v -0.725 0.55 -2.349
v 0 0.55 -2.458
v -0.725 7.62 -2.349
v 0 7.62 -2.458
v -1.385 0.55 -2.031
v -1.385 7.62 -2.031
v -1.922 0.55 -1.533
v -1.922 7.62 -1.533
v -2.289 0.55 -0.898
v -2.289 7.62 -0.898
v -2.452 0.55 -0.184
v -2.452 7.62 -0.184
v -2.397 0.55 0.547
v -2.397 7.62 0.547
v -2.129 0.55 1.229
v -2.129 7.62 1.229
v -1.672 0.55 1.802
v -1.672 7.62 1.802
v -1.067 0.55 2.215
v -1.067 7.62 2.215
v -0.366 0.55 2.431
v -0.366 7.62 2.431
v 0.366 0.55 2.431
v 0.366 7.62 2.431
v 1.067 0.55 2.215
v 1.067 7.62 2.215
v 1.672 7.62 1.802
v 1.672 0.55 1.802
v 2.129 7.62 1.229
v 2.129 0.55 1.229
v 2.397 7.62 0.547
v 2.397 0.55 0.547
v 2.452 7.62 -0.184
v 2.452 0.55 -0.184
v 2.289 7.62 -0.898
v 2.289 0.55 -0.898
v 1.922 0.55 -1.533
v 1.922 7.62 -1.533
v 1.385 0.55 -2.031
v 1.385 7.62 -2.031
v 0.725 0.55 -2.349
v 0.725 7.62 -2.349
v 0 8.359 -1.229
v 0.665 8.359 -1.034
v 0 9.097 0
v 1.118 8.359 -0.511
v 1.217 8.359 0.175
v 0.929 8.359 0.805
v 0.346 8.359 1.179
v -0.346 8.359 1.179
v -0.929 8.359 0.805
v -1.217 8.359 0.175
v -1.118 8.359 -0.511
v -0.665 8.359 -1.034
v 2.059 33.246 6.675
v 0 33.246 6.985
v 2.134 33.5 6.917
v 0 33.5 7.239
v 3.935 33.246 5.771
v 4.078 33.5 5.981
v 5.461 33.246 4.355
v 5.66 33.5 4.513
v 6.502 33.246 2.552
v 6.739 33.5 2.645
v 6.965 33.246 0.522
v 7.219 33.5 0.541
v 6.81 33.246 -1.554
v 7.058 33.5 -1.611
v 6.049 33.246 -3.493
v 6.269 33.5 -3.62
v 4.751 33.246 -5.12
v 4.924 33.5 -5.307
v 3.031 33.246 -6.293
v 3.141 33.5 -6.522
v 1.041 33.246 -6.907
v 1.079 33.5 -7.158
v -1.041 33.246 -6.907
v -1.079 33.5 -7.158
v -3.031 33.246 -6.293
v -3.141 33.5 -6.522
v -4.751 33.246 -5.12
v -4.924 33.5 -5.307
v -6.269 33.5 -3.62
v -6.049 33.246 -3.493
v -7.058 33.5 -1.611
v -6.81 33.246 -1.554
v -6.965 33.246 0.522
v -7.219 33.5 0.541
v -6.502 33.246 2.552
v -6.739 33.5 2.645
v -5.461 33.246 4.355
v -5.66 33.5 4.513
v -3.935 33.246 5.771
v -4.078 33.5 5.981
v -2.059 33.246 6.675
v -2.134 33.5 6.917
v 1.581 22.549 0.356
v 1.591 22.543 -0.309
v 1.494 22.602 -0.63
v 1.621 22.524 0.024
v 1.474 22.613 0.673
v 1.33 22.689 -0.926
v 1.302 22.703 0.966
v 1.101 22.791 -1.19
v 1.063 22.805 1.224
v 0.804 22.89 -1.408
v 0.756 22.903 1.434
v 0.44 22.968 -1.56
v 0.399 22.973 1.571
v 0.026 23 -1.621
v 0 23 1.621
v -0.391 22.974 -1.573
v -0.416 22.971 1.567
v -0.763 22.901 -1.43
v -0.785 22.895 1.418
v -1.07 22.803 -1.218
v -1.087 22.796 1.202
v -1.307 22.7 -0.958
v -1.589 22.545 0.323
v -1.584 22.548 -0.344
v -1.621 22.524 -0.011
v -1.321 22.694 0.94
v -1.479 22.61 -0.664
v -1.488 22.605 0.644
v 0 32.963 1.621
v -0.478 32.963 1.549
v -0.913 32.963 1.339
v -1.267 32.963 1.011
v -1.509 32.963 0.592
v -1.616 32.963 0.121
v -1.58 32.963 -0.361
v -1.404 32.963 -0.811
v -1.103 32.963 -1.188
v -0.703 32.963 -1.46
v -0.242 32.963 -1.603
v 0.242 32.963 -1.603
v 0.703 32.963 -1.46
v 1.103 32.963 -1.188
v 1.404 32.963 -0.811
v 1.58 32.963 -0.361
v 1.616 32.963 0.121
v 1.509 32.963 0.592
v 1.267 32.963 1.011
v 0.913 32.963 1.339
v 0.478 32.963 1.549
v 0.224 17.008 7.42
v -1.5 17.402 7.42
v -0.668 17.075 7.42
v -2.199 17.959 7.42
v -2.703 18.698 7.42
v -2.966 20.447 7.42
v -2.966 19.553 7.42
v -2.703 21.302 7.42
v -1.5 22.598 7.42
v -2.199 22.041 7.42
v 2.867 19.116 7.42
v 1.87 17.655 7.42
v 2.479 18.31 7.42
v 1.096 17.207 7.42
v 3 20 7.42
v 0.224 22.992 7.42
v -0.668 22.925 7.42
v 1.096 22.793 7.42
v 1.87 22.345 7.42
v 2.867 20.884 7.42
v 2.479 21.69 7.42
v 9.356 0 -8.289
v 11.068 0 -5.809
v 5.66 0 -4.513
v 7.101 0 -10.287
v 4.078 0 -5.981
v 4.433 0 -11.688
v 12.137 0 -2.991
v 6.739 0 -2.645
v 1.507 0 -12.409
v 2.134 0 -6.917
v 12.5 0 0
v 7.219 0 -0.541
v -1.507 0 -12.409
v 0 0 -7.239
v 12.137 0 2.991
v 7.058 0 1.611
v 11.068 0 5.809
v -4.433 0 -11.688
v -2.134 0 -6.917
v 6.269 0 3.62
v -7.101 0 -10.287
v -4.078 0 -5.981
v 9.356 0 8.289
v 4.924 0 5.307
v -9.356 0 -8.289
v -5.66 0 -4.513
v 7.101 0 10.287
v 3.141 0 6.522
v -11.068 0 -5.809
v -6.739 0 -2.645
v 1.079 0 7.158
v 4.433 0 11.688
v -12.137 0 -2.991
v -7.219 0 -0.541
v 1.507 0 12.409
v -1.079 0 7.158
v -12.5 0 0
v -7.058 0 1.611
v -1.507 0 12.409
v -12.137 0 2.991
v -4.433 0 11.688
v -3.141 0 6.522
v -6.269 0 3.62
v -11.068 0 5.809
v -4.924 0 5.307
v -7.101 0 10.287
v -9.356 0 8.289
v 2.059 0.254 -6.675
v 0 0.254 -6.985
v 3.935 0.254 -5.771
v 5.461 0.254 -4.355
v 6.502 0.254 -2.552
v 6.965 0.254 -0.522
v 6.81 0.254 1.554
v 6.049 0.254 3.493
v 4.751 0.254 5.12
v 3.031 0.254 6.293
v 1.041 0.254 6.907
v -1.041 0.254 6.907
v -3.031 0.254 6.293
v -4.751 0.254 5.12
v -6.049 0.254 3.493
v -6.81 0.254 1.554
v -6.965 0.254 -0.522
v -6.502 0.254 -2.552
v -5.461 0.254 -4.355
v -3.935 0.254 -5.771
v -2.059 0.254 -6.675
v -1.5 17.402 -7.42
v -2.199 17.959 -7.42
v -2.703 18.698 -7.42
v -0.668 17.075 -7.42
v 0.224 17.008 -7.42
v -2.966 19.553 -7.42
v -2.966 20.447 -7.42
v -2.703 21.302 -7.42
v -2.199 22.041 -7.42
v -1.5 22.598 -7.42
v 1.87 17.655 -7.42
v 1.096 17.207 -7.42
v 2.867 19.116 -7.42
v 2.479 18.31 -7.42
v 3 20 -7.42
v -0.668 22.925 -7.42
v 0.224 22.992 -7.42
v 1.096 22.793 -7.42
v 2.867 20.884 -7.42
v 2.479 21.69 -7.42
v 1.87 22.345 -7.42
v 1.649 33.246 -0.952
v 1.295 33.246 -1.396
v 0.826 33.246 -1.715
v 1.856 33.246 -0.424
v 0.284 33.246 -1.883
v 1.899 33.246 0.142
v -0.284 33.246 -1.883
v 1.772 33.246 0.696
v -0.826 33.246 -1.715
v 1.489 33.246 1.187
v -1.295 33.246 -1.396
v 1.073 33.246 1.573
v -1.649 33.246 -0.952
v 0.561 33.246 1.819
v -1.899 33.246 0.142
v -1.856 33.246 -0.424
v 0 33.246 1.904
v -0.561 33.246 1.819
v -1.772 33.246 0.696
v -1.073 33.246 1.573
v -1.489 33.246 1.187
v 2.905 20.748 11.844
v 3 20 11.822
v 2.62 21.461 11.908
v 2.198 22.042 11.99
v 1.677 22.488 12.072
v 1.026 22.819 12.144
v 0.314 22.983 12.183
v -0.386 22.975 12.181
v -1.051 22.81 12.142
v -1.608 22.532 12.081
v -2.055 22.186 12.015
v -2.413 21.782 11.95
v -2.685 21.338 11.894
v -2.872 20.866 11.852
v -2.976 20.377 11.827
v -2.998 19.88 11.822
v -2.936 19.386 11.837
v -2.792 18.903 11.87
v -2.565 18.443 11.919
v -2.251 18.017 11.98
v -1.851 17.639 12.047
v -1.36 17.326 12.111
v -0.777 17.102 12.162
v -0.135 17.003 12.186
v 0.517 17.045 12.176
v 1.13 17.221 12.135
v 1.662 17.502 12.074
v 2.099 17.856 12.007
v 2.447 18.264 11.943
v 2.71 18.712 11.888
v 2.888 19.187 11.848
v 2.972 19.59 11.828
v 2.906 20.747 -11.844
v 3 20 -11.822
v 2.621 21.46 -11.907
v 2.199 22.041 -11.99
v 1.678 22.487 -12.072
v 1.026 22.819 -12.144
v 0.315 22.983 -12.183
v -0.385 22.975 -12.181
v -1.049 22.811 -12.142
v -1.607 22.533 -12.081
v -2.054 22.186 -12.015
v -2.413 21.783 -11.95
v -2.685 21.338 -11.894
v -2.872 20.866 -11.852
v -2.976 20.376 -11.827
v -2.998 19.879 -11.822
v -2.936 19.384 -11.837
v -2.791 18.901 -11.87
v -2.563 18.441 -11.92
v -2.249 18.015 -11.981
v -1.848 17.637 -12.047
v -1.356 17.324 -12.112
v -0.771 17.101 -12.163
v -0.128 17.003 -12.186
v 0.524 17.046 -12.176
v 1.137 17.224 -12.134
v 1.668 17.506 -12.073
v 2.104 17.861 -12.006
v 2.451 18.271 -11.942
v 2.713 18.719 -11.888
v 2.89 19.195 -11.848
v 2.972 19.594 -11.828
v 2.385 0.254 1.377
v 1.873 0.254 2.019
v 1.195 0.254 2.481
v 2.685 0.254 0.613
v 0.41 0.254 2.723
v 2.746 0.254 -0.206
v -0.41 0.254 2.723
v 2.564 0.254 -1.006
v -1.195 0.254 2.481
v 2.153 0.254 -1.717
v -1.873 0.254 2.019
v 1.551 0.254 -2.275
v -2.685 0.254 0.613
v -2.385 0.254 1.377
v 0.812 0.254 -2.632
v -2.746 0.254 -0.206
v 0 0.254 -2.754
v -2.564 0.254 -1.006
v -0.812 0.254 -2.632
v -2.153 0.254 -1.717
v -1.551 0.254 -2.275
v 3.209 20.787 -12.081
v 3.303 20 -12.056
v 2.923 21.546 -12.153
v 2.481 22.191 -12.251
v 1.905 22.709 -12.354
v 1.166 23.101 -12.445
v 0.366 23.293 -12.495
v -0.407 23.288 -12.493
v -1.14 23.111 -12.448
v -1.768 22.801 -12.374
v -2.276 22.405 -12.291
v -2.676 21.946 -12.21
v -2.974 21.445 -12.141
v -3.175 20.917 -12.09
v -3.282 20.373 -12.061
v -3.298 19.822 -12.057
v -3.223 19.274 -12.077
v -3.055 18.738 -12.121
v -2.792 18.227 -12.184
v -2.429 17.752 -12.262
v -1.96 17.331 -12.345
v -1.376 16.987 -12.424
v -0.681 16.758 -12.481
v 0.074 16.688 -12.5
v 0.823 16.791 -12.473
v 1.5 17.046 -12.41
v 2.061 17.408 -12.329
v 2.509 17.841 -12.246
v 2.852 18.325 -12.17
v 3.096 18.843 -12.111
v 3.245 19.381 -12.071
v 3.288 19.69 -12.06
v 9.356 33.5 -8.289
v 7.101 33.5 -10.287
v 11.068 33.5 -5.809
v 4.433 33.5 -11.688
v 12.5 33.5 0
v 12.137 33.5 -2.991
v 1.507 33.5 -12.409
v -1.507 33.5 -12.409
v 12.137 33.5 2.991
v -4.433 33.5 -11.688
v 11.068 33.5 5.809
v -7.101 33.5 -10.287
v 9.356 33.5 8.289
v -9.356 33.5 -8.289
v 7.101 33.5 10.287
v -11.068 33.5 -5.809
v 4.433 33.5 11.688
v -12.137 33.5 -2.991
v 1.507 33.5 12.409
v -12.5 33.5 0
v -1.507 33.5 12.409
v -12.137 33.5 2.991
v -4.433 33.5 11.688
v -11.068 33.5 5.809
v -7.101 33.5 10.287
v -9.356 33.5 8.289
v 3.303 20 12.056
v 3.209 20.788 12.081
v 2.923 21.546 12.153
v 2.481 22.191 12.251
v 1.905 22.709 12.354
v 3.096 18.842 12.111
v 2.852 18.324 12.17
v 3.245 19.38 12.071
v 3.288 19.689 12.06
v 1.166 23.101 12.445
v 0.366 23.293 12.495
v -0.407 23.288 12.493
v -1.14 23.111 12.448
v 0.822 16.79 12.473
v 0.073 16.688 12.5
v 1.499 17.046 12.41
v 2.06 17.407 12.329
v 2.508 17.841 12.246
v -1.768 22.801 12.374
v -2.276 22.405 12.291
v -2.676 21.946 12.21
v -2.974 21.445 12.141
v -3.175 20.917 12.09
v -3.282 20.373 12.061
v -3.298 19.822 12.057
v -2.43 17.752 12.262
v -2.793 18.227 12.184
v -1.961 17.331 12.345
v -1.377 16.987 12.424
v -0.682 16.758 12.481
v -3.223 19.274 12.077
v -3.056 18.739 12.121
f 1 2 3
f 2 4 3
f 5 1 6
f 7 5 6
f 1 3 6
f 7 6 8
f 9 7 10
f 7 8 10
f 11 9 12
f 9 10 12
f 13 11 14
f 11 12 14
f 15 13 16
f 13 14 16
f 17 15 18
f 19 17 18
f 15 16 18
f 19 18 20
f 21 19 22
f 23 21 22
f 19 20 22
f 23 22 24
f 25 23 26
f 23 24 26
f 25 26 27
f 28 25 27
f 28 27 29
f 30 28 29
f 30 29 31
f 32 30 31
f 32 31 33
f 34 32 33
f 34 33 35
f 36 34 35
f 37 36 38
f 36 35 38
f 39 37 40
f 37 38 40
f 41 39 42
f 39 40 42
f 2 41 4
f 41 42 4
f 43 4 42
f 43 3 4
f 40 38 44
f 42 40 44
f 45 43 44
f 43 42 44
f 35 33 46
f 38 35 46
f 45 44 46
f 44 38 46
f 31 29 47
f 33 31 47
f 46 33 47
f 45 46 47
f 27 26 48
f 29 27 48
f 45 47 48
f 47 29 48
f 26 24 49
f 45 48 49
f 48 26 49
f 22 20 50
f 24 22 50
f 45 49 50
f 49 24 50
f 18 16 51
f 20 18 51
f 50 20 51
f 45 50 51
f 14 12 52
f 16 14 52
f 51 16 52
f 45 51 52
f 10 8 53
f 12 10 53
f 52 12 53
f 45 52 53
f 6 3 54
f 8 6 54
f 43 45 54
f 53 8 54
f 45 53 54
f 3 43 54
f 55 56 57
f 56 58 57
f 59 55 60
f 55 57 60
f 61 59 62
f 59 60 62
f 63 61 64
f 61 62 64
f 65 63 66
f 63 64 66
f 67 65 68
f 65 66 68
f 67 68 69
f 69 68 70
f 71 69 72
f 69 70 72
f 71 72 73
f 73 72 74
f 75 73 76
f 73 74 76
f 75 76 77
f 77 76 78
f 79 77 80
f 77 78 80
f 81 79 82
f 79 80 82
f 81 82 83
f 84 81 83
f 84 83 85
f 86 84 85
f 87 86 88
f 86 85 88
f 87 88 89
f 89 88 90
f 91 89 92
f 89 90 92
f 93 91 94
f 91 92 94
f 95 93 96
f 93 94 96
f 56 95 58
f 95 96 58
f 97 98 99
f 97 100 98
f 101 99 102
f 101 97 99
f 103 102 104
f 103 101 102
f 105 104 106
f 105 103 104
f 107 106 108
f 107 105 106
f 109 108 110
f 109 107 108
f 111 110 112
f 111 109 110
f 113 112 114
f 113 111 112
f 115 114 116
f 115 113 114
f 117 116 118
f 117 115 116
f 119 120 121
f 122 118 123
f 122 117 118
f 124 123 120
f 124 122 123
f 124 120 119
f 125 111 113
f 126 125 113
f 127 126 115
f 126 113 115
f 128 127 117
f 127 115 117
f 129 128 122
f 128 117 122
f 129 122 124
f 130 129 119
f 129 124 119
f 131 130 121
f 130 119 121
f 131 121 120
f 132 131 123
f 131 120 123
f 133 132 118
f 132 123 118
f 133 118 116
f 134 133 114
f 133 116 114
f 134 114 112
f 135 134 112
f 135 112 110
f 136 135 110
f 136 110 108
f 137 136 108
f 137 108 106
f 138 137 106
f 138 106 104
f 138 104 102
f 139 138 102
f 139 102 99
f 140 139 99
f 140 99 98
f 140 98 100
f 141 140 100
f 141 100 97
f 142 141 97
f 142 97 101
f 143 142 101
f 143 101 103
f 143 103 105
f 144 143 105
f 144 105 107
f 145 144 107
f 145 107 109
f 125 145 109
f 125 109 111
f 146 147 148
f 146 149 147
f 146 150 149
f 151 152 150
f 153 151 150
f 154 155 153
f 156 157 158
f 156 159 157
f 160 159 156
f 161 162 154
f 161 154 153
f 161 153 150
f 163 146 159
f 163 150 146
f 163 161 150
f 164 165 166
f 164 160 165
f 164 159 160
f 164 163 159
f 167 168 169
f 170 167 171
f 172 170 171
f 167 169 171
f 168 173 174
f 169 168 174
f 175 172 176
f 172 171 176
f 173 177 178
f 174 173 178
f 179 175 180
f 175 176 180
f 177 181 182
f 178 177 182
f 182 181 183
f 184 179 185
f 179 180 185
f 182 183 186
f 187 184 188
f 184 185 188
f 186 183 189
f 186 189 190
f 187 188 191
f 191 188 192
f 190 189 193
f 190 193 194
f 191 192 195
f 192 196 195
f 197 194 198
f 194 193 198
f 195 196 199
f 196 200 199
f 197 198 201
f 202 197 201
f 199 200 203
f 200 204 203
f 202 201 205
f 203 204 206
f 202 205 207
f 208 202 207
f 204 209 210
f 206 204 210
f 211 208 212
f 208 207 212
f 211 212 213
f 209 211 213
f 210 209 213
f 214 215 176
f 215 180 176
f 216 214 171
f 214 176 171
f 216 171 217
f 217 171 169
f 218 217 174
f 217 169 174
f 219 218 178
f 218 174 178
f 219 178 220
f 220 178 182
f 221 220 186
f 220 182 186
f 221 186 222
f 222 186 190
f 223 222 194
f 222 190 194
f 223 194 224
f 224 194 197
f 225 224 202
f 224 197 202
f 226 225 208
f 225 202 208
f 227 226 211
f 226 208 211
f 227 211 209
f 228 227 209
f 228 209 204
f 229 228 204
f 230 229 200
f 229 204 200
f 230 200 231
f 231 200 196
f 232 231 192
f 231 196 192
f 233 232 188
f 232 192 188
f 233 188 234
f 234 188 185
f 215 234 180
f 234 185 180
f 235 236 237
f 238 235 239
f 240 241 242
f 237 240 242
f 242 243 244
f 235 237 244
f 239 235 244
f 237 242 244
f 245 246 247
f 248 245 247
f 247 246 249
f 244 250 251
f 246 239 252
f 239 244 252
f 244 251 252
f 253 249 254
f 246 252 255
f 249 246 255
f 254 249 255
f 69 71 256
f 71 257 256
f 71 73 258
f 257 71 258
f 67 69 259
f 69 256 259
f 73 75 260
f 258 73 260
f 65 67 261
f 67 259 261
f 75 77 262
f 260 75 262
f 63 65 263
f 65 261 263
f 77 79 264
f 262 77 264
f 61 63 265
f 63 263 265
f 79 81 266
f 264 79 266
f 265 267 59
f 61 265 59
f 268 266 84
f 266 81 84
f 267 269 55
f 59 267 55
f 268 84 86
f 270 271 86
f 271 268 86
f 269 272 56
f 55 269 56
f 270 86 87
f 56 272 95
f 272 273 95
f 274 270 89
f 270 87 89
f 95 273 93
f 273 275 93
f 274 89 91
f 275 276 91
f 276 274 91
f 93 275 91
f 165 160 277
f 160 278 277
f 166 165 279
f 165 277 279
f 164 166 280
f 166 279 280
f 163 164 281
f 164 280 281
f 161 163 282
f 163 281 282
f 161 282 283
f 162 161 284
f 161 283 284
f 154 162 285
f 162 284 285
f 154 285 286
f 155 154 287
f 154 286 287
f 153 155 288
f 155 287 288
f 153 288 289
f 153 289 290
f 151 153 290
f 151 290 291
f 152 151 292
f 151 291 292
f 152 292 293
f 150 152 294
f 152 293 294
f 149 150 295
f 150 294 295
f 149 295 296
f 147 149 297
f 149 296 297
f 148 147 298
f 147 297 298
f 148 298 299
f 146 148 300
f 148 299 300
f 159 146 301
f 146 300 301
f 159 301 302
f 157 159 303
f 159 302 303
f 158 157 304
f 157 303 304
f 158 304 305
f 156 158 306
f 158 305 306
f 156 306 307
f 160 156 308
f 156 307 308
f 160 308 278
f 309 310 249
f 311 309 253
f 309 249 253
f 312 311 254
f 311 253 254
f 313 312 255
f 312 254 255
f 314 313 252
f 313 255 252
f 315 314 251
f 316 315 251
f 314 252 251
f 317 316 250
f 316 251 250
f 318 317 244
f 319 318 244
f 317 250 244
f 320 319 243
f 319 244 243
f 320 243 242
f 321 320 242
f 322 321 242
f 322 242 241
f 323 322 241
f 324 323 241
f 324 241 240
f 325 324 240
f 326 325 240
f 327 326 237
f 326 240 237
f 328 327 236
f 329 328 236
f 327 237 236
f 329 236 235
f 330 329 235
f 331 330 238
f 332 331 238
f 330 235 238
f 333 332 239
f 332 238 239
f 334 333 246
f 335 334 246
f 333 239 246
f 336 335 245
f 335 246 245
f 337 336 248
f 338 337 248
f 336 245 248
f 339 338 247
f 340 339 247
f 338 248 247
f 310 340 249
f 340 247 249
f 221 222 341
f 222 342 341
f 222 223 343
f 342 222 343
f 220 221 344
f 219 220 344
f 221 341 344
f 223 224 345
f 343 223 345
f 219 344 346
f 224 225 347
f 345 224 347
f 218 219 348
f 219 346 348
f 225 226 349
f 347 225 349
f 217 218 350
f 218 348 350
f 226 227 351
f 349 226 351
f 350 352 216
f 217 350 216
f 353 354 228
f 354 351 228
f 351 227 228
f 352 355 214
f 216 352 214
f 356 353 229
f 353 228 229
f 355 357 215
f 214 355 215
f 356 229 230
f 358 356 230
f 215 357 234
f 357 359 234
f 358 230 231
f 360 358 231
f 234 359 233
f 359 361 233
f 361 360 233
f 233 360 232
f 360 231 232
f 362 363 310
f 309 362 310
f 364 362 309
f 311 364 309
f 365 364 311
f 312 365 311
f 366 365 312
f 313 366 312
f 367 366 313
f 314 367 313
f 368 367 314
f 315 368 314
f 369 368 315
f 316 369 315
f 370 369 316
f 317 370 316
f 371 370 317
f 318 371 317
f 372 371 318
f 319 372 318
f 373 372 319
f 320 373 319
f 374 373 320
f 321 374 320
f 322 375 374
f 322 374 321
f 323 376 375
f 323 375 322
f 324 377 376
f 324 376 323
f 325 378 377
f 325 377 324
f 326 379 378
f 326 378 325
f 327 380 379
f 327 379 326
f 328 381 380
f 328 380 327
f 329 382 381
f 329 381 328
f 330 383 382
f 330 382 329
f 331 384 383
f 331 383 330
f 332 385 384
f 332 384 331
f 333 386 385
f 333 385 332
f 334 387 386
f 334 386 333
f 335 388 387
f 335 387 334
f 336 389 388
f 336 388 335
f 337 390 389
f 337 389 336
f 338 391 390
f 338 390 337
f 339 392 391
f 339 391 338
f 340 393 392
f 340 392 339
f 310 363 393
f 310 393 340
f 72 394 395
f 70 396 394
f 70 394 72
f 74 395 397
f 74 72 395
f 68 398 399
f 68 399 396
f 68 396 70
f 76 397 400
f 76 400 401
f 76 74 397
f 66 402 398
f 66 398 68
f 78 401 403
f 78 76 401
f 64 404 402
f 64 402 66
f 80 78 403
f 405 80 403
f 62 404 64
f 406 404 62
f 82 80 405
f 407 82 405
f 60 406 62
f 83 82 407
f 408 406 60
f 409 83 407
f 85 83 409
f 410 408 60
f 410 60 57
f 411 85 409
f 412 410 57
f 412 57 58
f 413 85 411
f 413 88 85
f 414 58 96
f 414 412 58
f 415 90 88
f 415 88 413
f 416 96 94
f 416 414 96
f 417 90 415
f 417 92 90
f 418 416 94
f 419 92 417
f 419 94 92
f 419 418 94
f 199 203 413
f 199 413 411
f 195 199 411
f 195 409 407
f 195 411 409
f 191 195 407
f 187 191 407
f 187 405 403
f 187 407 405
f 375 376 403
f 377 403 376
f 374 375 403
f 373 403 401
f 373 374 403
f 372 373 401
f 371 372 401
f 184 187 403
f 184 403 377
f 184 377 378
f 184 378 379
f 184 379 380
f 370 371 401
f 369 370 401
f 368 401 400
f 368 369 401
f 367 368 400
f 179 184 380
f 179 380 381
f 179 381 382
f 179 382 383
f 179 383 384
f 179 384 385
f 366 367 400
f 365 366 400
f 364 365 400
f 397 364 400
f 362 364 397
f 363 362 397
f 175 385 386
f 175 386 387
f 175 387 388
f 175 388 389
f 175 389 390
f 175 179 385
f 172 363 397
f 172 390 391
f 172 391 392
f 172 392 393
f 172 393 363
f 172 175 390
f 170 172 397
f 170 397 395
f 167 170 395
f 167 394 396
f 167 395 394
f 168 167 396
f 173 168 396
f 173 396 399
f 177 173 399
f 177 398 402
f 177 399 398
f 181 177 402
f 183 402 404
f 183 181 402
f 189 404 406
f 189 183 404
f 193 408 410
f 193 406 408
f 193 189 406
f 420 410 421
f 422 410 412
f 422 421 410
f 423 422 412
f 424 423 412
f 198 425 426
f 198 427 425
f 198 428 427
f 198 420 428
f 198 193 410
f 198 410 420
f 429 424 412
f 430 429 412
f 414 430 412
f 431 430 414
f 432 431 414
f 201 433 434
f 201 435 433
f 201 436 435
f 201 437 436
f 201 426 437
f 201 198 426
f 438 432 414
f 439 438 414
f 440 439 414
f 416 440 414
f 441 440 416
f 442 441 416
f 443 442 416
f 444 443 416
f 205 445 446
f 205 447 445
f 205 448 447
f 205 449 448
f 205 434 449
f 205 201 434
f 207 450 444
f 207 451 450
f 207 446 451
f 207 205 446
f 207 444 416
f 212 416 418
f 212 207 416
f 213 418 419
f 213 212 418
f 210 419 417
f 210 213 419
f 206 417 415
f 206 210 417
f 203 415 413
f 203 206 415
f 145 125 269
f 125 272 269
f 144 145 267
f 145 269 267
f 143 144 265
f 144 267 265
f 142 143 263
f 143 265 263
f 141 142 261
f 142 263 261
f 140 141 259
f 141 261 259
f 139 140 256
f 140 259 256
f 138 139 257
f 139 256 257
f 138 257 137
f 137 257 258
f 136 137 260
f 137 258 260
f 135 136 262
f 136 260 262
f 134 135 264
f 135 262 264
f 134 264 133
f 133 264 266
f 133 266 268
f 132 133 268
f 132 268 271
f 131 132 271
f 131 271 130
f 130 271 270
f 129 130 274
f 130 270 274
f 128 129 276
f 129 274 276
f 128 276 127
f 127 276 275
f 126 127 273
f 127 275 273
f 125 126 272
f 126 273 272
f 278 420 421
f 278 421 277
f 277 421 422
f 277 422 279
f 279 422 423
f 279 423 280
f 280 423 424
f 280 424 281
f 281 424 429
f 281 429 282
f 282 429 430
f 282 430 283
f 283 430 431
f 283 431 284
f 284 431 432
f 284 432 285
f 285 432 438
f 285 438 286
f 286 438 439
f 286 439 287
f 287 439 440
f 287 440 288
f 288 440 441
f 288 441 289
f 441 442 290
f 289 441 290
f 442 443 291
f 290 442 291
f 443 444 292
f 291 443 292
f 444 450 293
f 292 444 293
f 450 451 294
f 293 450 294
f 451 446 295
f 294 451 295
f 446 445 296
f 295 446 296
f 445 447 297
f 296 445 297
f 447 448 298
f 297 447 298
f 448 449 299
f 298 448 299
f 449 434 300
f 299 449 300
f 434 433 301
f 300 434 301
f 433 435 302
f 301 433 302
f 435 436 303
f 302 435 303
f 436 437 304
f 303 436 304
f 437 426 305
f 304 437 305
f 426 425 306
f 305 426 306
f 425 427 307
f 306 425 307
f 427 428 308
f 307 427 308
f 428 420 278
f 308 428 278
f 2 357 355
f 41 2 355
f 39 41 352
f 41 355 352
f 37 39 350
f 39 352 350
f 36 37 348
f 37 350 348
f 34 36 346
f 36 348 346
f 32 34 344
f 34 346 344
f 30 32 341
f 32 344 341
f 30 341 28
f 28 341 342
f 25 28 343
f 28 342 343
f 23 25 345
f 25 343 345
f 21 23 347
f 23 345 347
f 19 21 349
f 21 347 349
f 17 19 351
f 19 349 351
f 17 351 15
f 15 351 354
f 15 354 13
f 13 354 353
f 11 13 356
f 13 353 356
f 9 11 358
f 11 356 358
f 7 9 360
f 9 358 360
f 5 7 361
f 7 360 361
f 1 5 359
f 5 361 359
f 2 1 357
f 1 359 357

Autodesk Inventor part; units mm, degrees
ref_plane "YZ Plane" through (0, 0, 0) normal (1, 0, 0) x (0, 1, 0)
ref_plane "XZ Plane" through (0, 0, 0) normal (0, 1, 0) x (-1, 0, 0)
ref_plane "XY Plane" through (0, 0, 0) normal (0, 0, 1) x (1, 0, 0)
sketch "Sketch1" plane through (0, 0, 0) normal (0, 1, 0) x (-1, 0, 0)
  circle A0 centre (0, 0) radius 12.5
  dimension "d0" = 25
extrude "Extrusion1" add sketch "Sketch1" along normal blind 33.5
hole "ReliefTop" at (0, 33.5, 0) direction (0, -1, 0) diameter 13.97 depth 0.254 countersink diameter 14.478 countersink angle 90
hole "ReliefBottom" at (0, 0, 0) direction (0, 1, 0) diameter 13.97 depth 0.254 countersink diameter 14.478 countersink angle 90
hole "MountBottomM6" at (0, 0.254, 0) direction (0, 1, 0) diameter 4.917 depth 7.366 tip angle 118 countersink diameter 5.508 countersink angle 90 thread size "M6x1" class "6H" standard "ISO Metric profile"
hole "MountTopM4" at (0, 33.246, 0) direction (0, -1, 0) diameter 3.242 depth 14.478 tip angle 118 countersink diameter 3.808 countersink angle 90 thread size "M4x0.7" class "6H" standard "ISO Metric profile"
sketch "Sketch2" plane through (0, 0, 0) normal (0, 0, 1) x (1, 0, 0)
  circle A0 centre (0, 20) radius 3
  line L0 (-12.5, 0) -> (12.5, 0) projected
  line L1 (0, -4.6) -> (0, 27.6) projected
  point P0 (0, 0)
  dimension "d49" = 6
  dimension "d50" = 20
extrude "Extrusion2" cut sketch "Sketch2" along normal through all both and the other way through all
chamfer "Chamfer1" distance 0.313 angle 45 2 edges at (-3, 19.9998, 12.1347) (-3, 19.9998, -12.1347)
extrude "Extrusion3" add sketch "Sketch2" along normal mid plane 14.84
equation "\"d1\" = height"
equation "\"d5\" = reliefMinor"
equation "\"d7\" = reliefMajor"
equation "\"d10\" = reliefDepth"
equation "\"d14\" = reliefMinor"
equation "\"d16\" = reliefMajor"
equation "\"d19\" = reliefDepth"
equation "\"d25\" = chamferM6"
equation "\"d28\" = depthM6"
equation "\"d40\" = chamferM4"
equation "\"d43\" = depthM4"
equation "\"reliefDepth\" = 0.254"
equation "\"reliefMinor\" = 13.97"
equation "\"reliefMajor\" = 14.478"
equation "\"chamferM6\" = 5.508"
equation "\"chamferM4\" = 3.808"
equation "\"depthM6\" = 7.366"
equation "\"depthM4\" = 14.478"
equation "\"height\" = 33.5"
properties part number "PLS-P642H0335A00_M" material "Stainless Steel"
